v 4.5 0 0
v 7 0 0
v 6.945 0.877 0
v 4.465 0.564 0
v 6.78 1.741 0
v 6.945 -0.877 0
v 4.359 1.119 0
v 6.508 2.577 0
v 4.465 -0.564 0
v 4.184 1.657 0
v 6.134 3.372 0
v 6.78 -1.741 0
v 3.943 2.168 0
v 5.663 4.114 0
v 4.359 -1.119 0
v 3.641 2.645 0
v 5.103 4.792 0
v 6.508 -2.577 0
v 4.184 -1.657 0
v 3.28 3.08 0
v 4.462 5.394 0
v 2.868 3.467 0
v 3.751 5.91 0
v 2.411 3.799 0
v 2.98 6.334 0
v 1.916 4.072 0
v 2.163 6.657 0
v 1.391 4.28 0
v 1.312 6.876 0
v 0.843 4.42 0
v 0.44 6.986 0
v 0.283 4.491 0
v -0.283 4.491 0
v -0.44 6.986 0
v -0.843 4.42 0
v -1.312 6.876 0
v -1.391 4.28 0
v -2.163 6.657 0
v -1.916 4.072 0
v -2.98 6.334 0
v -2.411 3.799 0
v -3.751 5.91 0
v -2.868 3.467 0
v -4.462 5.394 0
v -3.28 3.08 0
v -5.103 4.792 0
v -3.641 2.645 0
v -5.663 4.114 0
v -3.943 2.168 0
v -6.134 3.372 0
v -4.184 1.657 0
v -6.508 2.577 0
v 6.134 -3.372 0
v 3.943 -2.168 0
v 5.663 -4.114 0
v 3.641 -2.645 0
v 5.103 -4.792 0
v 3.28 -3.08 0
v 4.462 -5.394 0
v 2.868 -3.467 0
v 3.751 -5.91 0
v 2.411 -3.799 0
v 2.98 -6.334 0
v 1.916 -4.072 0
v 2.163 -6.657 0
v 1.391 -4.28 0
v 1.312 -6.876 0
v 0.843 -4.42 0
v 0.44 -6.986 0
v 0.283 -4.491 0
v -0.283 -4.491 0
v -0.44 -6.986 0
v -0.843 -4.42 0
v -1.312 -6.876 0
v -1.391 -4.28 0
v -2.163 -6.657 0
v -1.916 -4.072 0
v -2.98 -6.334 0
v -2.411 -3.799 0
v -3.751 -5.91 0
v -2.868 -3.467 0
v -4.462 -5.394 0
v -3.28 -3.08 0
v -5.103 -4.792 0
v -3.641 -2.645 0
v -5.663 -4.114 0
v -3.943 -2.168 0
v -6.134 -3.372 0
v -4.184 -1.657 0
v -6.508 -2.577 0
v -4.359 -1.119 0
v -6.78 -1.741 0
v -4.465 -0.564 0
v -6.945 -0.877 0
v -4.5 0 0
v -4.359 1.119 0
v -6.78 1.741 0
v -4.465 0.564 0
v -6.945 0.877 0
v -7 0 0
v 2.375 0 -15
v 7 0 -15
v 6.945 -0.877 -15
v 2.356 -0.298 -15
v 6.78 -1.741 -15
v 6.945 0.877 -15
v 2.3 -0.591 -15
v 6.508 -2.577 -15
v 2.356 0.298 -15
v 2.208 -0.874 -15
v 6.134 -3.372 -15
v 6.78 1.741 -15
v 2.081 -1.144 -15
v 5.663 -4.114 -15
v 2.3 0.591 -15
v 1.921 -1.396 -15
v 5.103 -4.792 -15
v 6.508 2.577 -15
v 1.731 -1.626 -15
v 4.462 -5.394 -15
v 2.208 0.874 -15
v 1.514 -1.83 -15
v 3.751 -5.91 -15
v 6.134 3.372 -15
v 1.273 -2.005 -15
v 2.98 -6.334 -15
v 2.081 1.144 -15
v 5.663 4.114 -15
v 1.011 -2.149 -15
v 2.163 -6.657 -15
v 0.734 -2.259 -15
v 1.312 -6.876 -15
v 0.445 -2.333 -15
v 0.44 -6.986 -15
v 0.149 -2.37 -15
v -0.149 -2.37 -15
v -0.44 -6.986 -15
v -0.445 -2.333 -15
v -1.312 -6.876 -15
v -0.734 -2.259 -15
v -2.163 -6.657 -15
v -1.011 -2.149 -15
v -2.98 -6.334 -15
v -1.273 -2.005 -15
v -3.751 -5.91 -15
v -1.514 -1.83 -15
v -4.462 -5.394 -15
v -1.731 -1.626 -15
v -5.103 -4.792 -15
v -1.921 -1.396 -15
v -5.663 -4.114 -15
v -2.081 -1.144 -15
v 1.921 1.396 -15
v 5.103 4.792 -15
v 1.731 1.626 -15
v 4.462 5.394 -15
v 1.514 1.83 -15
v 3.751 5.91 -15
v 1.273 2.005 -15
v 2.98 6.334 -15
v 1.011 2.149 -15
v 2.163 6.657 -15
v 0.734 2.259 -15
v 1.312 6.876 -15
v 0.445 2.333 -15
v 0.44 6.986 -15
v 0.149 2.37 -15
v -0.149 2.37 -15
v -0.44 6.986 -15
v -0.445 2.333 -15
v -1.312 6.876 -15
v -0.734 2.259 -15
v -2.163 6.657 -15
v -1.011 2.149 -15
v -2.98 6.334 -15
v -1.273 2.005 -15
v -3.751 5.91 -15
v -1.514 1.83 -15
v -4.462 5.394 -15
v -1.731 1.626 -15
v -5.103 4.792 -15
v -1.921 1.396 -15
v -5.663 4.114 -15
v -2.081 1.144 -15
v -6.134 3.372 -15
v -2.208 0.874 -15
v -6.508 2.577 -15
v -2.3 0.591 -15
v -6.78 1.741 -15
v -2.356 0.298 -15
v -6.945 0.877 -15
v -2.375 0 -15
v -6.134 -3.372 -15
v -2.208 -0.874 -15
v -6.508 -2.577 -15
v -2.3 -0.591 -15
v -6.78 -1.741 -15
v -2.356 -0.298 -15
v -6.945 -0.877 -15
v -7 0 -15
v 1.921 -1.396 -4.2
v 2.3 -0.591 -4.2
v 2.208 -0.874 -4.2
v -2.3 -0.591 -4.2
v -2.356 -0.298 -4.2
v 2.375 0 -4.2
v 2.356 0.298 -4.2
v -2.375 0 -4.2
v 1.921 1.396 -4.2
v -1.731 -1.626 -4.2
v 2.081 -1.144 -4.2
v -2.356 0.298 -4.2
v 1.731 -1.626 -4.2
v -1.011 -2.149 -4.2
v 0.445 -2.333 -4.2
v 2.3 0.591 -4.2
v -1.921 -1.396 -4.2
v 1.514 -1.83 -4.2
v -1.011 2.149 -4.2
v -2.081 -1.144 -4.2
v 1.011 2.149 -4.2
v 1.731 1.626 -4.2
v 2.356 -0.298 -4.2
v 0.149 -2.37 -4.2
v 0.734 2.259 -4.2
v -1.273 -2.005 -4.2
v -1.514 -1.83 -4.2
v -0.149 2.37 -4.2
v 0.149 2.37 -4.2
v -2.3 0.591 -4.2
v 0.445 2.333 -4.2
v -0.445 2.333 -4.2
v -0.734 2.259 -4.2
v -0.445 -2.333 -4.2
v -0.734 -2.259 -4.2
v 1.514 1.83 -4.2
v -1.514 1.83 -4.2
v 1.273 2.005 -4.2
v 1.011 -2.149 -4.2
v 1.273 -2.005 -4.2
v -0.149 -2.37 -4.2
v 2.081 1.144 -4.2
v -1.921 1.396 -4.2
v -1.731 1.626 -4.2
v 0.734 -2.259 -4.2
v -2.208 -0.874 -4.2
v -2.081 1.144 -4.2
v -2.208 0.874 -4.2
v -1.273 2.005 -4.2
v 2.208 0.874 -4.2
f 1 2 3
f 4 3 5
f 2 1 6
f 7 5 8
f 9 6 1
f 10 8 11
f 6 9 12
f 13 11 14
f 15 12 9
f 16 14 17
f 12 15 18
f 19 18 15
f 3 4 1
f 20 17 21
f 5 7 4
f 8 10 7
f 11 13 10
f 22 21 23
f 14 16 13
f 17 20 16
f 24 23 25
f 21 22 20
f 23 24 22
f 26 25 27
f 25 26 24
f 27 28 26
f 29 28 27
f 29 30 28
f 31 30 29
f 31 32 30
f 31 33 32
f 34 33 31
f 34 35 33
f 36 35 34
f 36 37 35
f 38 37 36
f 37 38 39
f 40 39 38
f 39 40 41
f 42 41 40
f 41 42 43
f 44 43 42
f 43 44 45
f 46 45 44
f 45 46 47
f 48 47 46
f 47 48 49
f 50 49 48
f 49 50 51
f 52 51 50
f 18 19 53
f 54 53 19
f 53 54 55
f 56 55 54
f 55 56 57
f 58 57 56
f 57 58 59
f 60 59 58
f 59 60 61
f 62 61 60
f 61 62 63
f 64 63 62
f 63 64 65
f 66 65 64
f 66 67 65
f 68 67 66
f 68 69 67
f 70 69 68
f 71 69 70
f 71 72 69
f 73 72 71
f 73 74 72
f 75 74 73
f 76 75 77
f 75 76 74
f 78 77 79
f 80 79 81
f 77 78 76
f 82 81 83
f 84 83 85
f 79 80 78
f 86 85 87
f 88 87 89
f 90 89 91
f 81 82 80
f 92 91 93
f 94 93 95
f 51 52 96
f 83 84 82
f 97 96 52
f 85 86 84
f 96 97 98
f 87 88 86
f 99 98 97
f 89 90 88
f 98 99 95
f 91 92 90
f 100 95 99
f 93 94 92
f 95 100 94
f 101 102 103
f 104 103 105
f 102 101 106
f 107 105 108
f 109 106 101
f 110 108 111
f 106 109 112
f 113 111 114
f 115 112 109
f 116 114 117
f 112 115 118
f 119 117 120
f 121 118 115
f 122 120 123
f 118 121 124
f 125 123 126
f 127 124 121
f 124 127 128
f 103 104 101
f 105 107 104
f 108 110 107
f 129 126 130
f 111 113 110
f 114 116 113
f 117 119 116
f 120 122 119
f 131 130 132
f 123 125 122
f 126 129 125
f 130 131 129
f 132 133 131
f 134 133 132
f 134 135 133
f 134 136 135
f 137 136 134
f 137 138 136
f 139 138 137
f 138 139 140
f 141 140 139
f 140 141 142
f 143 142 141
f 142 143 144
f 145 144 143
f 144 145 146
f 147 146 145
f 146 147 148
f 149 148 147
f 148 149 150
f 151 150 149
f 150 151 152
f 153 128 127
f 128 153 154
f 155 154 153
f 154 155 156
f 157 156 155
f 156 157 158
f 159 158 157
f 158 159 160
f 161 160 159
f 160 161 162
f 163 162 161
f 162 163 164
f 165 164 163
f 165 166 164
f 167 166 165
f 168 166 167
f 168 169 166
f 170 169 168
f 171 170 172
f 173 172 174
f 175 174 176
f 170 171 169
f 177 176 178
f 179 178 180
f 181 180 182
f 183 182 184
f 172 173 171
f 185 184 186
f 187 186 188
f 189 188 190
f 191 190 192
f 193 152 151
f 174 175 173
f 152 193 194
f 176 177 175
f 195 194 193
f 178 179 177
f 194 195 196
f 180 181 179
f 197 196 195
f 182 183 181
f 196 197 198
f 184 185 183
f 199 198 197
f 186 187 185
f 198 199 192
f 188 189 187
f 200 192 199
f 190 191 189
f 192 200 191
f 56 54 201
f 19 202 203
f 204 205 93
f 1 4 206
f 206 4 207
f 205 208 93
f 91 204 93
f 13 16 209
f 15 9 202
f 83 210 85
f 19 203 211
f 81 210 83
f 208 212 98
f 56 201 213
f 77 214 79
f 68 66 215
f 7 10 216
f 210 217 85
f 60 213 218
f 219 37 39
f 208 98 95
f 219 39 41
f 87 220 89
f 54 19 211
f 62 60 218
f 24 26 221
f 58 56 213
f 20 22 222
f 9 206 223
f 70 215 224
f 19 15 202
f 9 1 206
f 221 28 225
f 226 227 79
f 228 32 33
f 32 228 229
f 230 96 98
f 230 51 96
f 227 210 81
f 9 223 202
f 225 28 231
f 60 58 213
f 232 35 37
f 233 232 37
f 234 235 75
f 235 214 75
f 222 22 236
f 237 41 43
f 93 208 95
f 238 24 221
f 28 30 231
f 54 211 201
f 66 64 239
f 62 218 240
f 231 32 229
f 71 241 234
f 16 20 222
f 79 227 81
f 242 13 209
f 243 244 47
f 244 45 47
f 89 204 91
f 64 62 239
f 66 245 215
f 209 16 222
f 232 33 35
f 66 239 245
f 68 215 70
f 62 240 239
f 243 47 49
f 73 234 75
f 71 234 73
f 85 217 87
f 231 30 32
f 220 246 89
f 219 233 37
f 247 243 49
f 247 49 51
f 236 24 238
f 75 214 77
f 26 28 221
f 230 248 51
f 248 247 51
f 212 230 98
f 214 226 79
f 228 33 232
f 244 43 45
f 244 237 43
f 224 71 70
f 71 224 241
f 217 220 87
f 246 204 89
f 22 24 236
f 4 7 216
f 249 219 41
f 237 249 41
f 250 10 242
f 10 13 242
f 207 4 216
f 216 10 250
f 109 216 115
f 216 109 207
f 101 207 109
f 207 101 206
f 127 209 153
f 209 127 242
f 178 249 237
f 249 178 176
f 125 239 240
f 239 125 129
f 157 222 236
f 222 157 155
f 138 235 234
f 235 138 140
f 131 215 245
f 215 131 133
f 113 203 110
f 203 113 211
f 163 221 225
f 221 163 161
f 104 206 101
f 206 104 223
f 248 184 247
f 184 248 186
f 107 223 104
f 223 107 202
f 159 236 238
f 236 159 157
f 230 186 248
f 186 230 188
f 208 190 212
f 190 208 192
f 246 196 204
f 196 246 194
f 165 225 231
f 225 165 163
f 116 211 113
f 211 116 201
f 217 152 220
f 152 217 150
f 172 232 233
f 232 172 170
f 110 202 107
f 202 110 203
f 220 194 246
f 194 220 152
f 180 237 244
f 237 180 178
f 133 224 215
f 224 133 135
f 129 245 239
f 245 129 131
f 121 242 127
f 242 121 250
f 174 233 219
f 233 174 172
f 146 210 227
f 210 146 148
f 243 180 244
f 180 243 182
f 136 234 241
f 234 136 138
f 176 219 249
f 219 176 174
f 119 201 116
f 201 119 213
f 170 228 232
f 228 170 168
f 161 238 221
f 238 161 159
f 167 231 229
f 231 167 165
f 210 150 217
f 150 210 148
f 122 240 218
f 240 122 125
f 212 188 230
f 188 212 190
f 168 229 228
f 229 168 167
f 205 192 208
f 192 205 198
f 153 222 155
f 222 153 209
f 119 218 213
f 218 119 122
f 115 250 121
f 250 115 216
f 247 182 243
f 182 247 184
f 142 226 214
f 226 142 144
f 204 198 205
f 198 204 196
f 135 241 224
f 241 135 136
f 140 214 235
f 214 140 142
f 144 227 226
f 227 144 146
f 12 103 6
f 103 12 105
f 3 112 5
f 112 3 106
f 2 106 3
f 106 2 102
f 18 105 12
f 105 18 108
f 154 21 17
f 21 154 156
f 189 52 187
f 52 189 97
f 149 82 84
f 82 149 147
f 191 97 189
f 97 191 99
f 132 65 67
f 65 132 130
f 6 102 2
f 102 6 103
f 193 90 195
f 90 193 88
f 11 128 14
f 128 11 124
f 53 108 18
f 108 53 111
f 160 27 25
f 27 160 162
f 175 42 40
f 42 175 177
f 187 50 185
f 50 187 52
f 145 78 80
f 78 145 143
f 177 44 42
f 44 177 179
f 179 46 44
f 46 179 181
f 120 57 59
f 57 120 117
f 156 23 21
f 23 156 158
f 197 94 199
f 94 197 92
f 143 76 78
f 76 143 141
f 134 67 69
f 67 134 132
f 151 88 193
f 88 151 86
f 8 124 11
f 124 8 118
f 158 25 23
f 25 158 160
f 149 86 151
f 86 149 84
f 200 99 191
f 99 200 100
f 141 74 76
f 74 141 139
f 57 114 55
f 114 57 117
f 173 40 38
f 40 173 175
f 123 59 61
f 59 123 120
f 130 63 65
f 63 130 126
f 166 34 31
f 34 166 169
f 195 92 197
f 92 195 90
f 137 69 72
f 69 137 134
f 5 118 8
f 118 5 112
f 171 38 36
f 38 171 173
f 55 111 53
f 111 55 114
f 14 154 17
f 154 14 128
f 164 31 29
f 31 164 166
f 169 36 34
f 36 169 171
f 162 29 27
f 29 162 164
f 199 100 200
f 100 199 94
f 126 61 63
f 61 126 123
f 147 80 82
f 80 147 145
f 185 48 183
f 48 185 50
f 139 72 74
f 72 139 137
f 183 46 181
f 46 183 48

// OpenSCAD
$fn = 50;


difference() {
	union() {
		translate(v = [0, 0, -15.0000000000]) {
			cylinder(h = 15, r = 7.0000000000);
		}
		cylinder(h = 0, r = 16.0000000000);
	}
	union() {
		translate(v = [0, 0, 0]) {
			rotate(a = [0, 0, 0]) {
				difference() {
					union() {
						#translate(v = [0, 0, -15.0000000000]) {
							cylinder(h = 15, r = 2.2500000000);
						}
						#translate(v = [0, 0, -4.2000000000]) {
							cylinder(h = 4.2000000000, r1 = 2.3750000000, r2 = 4.5000000000);
						}
						#translate(v = [0, 0, -15.0000000000]) {
							cylinder(h = 15, r = 2.3750000000);
						}
						#translate(v = [0, 0, -15.0000000000]) {
							cylinder(h = 15, r = 2.2500000000);
						}
					}
					union();
				}
			}
		}
	}
}
